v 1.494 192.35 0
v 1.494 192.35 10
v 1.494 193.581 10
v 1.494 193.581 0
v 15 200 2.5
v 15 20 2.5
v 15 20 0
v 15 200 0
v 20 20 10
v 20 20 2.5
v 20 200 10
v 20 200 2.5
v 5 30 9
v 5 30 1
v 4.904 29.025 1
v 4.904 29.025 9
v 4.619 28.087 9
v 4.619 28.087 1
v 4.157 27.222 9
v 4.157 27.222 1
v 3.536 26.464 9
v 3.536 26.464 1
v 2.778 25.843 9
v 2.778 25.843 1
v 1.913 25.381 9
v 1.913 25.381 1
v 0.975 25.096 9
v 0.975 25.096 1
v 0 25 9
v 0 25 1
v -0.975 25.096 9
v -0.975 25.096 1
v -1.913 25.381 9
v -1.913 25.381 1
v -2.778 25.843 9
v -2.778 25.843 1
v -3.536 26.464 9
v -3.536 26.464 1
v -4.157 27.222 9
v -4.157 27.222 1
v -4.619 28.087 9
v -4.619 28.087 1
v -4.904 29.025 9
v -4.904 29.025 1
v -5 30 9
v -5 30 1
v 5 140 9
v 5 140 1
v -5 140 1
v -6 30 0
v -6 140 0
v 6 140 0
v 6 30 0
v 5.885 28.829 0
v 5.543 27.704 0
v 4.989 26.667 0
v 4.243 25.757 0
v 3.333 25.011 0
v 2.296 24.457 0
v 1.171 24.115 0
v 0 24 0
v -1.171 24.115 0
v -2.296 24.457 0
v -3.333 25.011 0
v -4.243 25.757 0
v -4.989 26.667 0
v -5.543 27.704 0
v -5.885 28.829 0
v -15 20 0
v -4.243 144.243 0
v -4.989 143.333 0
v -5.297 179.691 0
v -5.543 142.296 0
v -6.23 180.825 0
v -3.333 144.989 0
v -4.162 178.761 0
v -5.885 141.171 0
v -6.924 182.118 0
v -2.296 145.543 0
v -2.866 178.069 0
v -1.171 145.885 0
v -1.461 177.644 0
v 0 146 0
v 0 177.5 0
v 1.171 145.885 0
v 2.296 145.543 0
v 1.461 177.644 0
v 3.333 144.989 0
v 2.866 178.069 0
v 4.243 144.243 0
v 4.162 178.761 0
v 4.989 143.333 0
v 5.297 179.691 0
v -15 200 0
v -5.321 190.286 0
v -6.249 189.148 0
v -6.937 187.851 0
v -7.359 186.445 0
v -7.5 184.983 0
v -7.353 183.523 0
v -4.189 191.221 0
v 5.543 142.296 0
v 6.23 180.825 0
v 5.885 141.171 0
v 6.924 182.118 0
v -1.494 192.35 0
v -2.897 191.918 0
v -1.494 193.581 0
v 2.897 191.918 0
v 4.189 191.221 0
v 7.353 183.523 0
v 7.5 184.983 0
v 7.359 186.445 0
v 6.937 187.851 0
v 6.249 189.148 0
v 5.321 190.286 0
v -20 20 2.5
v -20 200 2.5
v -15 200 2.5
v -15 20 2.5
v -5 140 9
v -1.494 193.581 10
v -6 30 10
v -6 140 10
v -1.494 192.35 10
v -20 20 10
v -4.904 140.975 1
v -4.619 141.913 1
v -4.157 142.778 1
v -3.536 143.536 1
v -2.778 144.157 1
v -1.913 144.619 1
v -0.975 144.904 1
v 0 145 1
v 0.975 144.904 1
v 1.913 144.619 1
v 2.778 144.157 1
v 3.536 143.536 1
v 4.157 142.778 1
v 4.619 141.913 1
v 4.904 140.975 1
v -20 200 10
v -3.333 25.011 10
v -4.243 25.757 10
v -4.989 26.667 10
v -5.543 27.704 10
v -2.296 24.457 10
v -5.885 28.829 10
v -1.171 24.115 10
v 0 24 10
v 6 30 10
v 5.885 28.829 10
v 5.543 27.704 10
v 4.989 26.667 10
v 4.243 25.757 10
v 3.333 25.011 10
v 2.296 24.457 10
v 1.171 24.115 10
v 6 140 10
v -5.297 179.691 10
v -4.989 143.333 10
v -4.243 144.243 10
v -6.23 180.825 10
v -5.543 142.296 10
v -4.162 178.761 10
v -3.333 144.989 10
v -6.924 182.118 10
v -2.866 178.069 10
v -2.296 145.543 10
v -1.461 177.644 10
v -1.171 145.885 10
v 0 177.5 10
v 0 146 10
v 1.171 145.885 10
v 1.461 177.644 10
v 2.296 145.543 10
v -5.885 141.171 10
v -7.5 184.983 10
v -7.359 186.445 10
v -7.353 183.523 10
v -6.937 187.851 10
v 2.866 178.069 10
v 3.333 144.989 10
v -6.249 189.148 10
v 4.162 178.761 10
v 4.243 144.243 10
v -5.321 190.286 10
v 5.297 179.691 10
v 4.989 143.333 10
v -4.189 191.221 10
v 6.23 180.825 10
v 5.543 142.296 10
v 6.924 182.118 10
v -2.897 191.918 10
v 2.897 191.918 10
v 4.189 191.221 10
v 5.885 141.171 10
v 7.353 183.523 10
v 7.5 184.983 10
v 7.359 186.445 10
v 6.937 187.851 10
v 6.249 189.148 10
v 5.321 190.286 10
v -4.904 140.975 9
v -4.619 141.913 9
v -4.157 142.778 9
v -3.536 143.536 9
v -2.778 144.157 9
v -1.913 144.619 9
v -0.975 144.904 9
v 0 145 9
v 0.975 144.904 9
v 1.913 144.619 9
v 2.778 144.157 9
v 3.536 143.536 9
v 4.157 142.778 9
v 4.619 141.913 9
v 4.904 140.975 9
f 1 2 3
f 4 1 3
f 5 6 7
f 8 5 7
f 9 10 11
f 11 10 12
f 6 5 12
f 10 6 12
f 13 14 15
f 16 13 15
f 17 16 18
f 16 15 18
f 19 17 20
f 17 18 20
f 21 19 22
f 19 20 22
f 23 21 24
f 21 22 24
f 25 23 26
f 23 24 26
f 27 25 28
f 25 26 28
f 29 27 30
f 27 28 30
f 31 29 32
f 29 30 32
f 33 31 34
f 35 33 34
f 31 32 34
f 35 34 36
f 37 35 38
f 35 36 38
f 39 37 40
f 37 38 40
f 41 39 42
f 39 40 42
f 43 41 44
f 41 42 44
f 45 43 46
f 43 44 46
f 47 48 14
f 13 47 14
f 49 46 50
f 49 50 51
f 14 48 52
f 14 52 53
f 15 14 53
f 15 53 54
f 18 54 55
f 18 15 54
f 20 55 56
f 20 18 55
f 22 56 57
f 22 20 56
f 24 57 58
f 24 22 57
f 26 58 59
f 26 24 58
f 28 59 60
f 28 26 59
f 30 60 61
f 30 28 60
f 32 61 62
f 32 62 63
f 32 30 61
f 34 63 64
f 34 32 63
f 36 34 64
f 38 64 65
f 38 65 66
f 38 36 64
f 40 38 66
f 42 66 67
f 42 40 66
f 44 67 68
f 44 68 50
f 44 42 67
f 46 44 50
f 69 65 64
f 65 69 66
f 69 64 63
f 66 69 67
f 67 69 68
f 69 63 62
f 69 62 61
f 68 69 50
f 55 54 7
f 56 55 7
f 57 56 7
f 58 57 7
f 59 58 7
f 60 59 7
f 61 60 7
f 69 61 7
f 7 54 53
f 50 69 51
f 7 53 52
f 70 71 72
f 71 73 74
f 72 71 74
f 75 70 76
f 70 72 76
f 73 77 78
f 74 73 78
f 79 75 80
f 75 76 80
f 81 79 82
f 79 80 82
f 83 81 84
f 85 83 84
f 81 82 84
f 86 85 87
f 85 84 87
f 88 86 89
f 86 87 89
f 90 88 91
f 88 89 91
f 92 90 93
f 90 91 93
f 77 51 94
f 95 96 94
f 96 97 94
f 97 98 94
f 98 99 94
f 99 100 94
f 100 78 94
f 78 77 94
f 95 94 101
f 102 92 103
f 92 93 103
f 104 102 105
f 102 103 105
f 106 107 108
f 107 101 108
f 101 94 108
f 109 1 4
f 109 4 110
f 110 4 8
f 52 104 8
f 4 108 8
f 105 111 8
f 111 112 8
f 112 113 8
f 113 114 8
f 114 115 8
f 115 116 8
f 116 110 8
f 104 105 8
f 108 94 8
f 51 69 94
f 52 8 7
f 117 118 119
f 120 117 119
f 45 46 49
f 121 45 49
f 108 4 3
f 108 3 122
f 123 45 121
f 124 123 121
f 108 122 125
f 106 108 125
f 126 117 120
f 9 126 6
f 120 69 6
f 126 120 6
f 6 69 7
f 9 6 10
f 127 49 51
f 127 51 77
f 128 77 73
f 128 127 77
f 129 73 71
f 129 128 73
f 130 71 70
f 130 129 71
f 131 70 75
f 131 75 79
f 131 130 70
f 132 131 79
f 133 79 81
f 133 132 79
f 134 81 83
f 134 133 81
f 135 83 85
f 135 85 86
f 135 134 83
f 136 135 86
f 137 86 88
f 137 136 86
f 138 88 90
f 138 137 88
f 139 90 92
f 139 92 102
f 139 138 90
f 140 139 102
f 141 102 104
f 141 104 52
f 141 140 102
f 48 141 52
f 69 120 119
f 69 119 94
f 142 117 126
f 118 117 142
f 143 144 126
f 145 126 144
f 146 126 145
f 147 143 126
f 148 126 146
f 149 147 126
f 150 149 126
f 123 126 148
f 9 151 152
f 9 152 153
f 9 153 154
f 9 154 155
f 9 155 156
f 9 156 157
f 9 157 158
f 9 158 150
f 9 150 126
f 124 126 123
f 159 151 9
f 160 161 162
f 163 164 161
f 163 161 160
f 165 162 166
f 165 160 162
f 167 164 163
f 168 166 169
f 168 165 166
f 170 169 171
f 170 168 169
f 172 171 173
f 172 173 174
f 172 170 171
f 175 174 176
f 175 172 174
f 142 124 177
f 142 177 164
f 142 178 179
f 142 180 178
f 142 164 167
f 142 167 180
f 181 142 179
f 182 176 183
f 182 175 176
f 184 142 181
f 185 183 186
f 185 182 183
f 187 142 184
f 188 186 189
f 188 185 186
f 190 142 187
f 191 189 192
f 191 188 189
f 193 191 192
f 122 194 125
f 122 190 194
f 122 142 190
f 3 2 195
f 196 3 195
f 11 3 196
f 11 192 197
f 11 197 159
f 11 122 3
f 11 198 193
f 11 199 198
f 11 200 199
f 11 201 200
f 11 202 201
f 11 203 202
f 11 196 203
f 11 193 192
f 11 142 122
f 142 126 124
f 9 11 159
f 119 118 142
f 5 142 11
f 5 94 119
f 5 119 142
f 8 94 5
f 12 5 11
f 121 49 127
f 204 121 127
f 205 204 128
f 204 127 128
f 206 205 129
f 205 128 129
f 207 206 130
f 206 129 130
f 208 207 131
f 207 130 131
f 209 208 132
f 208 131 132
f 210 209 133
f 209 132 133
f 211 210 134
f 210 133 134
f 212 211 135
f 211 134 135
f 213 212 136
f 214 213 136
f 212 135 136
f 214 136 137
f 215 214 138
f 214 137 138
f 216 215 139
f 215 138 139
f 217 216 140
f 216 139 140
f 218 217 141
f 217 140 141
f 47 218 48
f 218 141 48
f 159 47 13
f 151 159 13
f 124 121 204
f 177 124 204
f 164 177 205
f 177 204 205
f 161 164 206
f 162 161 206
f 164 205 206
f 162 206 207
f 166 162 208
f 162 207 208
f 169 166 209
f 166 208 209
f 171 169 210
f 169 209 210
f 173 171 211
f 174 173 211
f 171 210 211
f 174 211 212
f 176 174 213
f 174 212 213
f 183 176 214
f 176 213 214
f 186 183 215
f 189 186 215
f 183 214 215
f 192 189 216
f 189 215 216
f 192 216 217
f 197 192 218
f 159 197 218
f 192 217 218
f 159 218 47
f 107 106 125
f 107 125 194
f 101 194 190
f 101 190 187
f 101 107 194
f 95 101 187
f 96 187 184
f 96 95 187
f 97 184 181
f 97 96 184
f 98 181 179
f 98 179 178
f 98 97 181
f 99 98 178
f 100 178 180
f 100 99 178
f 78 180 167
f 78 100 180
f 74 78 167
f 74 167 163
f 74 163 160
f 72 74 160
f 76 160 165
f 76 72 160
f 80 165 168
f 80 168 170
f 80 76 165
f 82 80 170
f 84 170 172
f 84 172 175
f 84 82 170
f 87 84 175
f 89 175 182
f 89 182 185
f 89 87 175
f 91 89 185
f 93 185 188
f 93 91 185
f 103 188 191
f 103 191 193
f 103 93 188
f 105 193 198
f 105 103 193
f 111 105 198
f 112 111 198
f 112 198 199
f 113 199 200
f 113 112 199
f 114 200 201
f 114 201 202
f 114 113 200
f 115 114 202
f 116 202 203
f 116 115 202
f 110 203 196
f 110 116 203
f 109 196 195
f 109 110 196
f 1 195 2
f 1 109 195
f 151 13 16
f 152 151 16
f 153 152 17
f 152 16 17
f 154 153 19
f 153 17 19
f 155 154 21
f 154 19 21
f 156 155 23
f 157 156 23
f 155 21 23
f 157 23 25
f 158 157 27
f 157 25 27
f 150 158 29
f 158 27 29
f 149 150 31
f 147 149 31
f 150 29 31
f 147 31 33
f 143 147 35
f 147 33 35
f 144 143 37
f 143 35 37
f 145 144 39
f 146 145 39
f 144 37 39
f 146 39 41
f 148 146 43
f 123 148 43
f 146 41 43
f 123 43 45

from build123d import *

# Parameters (mm, degrees)
SZKIC1_W                    = 40
SZKIC1_H                    = 180
DODANIE_WYCI_GNI_CIE1_DEPTH = 10
SZKIC2_W                    = 5
SZKIC2_H                    = 2.5
WYTNIJ_WYCI_GNI_CIE1_DEPTH  = 182.383571472
SFAZOWANIE1_SIZE            = 1


with BuildPart() as part:
    # Szkic1 → Dodanie-wyciągnięcie1 (new body)
    with BuildSketch(Plane.XY):
        with Locations((0, 110)):
            Rectangle(SZKIC1_W, SZKIC1_H)
        with BuildLine():
            Line((1.493515455, 193.580554333), (-1.493515455, 193.580554333))
            Line((-1.493515455, 193.580554333), (-1.493515455, 192.349789901))
            ThreePointArc((-1.493515455, 192.349789901), (0, 177.5), (1.493515455, 192.349789901))
            Line((1.493515455, 192.349789901), (1.493515455, 193.580554333))
        make_face(mode=Mode.SUBTRACT)
        with BuildLine():
            Line((5, 140), (5, 30))
            ThreePointArc((5, 30), (0, 25), (-5, 30))
            Line((-5, 30), (-5, 140))
            ThreePointArc((-5, 140), (0, 145), (5, 140))
        make_face(mode=Mode.SUBTRACT)
    extrude(amount=DODANIE_WYCI_GNI_CIE1_DEPTH)

    # Szkic2 → Wytnij-wyciągnięcie1 (cut, through all)
    with BuildSketch(Plane(origin=(0, 200, 0), x_dir=(1, 0, 0), z_dir=(0, 1, 0))):
        with Locations((-17.5, -1.25)):
            Rectangle(SZKIC2_W, SZKIC2_H)
        with Locations((17.5, -1.25)):
            Rectangle(SZKIC2_W, SZKIC2_H)
    extrude(amount=-WYTNIJ_WYCI_GNI_CIE1_DEPTH, mode=Mode.SUBTRACT)

    # Sfazowanie1
    sfazowanie1_edges = [part.edges().sort_by_distance(p)[0] for p in [
        (0, 145, 0),
        (-5, 85, 0),
        (0, 25, 0),
        (5, 85, 0),
        (0, 145, 10),
        (-5, 85, 10),
        (0, 25, 10),
        (5, 85, 10),
    ]]
    chamfer(sfazowanie1_edges, length=SFAZOWANIE1_SIZE)


solid = part.part
